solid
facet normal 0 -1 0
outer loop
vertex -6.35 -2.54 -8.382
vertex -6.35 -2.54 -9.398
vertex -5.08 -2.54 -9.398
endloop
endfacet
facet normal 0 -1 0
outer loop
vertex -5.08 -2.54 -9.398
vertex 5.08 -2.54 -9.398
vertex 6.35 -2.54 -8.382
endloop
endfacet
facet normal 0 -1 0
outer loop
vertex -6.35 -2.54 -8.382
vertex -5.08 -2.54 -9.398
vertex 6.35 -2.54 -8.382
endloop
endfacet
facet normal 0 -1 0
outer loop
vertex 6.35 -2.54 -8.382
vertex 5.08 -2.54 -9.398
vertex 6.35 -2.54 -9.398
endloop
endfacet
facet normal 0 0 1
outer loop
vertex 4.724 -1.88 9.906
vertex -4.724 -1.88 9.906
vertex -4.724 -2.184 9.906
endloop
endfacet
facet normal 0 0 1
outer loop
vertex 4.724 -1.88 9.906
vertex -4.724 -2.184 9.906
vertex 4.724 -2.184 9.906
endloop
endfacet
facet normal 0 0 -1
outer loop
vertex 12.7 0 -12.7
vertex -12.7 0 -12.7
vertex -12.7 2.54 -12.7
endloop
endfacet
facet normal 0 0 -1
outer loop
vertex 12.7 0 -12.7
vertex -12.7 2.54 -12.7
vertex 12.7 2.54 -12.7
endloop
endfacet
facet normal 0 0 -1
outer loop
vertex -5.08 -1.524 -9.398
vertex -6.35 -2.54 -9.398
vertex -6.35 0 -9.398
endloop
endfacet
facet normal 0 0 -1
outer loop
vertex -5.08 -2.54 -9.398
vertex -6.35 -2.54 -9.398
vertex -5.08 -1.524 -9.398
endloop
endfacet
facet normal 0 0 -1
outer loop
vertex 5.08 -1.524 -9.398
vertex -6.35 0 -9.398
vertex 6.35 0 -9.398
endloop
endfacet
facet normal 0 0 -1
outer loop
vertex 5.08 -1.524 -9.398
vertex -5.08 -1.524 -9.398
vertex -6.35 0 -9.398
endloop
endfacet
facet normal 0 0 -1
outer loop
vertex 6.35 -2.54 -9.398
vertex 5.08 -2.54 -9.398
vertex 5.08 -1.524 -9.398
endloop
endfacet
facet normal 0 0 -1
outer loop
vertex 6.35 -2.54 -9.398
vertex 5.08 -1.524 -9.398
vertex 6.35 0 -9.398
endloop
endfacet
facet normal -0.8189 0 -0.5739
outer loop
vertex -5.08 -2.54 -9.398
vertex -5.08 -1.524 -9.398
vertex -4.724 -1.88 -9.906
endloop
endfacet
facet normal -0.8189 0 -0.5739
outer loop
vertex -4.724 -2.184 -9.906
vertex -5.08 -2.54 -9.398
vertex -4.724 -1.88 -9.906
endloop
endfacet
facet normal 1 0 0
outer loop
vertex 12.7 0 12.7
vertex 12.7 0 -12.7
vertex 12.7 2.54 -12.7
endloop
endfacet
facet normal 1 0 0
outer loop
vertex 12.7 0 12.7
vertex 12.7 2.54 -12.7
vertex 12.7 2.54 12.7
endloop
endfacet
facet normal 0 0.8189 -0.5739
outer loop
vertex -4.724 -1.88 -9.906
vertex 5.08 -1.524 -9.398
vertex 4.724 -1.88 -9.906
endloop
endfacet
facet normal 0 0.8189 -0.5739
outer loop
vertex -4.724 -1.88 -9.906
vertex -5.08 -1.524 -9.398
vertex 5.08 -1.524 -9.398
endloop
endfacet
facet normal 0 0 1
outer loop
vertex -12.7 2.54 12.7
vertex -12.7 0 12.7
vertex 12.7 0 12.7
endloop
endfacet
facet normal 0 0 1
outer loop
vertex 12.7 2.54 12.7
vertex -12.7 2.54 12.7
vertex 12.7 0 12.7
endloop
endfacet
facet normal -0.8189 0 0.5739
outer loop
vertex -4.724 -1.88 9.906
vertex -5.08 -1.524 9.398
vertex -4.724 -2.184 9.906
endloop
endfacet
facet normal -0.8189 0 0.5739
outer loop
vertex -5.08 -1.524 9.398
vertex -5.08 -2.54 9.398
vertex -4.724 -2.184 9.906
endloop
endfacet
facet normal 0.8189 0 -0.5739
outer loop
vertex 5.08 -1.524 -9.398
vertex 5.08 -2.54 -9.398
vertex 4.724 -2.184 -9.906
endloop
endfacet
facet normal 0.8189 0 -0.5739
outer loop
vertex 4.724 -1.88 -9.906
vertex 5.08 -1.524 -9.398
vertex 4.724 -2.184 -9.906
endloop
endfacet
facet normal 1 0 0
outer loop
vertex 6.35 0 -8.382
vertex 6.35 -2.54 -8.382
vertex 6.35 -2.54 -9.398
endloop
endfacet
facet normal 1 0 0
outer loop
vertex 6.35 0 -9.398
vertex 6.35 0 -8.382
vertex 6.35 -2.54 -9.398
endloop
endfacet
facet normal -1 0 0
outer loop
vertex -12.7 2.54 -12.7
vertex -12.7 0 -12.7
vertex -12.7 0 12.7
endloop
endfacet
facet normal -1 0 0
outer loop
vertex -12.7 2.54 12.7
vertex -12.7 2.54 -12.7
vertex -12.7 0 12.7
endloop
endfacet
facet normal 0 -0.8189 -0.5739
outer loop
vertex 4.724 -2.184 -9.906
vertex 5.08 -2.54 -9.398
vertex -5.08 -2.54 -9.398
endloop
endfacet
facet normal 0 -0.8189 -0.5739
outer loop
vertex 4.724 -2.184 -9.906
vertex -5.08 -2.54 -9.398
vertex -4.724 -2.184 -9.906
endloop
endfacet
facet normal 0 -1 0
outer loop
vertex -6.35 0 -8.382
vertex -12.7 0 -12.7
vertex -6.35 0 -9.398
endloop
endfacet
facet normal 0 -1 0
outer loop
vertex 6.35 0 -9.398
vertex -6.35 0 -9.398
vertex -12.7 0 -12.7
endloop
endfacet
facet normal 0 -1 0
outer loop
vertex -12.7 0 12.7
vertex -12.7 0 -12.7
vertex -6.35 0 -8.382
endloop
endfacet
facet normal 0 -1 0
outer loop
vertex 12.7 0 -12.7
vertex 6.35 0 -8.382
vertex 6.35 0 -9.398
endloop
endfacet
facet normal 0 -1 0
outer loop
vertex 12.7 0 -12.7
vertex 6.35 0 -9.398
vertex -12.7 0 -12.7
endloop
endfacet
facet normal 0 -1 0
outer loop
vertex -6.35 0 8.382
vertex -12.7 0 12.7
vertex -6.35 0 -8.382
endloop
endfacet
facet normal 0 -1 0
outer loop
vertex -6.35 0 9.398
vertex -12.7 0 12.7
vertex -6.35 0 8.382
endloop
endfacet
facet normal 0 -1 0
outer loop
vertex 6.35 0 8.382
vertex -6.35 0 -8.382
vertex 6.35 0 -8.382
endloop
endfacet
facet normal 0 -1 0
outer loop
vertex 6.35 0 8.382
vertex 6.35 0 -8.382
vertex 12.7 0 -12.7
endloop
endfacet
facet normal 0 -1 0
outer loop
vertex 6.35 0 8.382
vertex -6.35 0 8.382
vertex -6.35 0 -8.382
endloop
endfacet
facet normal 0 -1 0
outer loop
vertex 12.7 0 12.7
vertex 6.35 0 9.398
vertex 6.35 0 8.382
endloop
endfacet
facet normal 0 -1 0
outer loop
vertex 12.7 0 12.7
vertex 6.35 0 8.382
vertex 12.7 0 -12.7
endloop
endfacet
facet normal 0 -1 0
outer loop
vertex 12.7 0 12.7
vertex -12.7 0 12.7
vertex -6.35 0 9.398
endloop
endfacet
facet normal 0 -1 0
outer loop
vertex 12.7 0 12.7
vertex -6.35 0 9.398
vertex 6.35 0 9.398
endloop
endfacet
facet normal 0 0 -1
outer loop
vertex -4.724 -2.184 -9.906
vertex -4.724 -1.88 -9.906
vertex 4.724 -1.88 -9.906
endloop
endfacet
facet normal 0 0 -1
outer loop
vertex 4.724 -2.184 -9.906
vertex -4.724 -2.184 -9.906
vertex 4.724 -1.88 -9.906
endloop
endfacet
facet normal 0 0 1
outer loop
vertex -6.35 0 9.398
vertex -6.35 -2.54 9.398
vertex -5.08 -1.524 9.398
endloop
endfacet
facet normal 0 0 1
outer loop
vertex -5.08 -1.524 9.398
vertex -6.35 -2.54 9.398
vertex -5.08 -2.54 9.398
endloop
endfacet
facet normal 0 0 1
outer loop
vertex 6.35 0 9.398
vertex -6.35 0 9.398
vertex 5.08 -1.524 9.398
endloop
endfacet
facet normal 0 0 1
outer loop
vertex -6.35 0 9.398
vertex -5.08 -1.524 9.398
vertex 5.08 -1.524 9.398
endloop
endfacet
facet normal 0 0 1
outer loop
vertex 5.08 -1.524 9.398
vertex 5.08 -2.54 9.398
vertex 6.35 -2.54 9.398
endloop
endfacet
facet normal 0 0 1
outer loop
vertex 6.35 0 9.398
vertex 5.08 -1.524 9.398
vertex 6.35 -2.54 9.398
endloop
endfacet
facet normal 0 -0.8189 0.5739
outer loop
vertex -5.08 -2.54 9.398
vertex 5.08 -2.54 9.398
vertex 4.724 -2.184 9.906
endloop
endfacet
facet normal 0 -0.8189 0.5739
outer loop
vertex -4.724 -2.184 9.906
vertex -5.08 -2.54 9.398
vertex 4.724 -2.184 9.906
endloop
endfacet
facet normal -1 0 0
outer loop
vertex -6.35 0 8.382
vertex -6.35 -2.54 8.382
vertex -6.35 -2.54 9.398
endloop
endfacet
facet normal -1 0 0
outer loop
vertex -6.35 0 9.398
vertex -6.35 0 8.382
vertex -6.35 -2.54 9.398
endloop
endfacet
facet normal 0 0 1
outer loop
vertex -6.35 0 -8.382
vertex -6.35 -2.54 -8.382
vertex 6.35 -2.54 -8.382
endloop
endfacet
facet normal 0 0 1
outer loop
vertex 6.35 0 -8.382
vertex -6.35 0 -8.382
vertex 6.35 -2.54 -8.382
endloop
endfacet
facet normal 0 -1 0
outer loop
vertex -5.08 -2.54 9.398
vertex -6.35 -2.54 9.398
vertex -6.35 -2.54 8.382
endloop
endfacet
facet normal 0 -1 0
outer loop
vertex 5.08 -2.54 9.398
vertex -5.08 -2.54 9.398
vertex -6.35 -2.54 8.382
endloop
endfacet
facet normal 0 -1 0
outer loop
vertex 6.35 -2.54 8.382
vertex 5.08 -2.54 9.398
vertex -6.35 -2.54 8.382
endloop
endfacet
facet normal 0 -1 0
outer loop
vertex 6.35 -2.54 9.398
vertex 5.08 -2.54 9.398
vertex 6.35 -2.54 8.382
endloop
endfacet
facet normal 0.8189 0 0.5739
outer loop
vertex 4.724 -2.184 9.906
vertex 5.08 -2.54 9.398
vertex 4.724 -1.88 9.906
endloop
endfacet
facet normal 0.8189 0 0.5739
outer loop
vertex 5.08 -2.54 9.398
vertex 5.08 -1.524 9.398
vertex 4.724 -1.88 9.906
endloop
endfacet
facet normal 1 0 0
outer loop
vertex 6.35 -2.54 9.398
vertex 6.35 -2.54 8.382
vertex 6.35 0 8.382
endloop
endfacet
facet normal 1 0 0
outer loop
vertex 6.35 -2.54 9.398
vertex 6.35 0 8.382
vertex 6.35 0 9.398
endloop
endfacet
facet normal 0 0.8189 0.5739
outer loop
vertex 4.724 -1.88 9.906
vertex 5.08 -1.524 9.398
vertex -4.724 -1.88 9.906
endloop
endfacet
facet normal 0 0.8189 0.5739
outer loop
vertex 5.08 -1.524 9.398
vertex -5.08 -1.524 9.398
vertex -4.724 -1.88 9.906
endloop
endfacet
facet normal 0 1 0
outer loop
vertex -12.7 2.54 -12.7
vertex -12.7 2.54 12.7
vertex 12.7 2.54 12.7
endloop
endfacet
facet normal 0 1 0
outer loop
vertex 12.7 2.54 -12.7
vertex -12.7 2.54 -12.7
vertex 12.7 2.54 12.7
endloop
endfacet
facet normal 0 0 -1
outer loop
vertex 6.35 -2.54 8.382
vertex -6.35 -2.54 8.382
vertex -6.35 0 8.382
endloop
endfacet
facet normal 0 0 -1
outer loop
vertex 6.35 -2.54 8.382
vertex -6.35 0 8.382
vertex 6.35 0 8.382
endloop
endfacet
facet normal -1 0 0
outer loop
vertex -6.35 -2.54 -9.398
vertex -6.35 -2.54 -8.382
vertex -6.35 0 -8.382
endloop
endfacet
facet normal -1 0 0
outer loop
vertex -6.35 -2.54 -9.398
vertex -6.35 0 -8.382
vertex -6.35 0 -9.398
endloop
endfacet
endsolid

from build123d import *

# Parameters (mm, degrees)
F0_W          = 12.7
F0_H          = 1.016
F1_DEPTH      = 2.54
F1_DEPTH_BACK = 2.54
F0_W_2        = 25.4
F0_H_2        = 25.4
F2_DEPTH      = 2.54
F3_W          = 10.16
F3_H          = 1.016
F4_DEPTH      = 0.508
F4_TAPER      = 35


with BuildPart() as f1:
    # F0 (on Front) → F1 (new body, two sides)
    with BuildSketch(Plane.XZ) as f1_sk:
        with Locations((0, 8.89)):
            Rectangle(F0_W, F0_H)
    extrude(amount=F1_DEPTH)
    extrude(f1_sk.sketch, amount=-F1_DEPTH_BACK)

    # F0 (on Front) → F2 (join)
    with BuildSketch(Plane.XZ):
        Rectangle(F0_W_2, F0_H_2)
        with Locations((0, 8.89)):
            Rectangle(F0_W, F0_H, mode=Mode.SUBTRACT)
    extrude(amount=-F2_DEPTH)

    # F3 (on face) → F4 (join)
    with BuildSketch(Plane.XY.offset(9.398)):
        with Locations((0, -2.032)):
            Rectangle(F3_W, F3_H)
    extrude(amount=F4_DEPTH, taper=F4_TAPER)

    # F5: F1 across plane


with BuildPart() as f1_1:
    add(f1.part)
    add(f1.part.mirror(Plane.XY))


solid = f1_1.part
